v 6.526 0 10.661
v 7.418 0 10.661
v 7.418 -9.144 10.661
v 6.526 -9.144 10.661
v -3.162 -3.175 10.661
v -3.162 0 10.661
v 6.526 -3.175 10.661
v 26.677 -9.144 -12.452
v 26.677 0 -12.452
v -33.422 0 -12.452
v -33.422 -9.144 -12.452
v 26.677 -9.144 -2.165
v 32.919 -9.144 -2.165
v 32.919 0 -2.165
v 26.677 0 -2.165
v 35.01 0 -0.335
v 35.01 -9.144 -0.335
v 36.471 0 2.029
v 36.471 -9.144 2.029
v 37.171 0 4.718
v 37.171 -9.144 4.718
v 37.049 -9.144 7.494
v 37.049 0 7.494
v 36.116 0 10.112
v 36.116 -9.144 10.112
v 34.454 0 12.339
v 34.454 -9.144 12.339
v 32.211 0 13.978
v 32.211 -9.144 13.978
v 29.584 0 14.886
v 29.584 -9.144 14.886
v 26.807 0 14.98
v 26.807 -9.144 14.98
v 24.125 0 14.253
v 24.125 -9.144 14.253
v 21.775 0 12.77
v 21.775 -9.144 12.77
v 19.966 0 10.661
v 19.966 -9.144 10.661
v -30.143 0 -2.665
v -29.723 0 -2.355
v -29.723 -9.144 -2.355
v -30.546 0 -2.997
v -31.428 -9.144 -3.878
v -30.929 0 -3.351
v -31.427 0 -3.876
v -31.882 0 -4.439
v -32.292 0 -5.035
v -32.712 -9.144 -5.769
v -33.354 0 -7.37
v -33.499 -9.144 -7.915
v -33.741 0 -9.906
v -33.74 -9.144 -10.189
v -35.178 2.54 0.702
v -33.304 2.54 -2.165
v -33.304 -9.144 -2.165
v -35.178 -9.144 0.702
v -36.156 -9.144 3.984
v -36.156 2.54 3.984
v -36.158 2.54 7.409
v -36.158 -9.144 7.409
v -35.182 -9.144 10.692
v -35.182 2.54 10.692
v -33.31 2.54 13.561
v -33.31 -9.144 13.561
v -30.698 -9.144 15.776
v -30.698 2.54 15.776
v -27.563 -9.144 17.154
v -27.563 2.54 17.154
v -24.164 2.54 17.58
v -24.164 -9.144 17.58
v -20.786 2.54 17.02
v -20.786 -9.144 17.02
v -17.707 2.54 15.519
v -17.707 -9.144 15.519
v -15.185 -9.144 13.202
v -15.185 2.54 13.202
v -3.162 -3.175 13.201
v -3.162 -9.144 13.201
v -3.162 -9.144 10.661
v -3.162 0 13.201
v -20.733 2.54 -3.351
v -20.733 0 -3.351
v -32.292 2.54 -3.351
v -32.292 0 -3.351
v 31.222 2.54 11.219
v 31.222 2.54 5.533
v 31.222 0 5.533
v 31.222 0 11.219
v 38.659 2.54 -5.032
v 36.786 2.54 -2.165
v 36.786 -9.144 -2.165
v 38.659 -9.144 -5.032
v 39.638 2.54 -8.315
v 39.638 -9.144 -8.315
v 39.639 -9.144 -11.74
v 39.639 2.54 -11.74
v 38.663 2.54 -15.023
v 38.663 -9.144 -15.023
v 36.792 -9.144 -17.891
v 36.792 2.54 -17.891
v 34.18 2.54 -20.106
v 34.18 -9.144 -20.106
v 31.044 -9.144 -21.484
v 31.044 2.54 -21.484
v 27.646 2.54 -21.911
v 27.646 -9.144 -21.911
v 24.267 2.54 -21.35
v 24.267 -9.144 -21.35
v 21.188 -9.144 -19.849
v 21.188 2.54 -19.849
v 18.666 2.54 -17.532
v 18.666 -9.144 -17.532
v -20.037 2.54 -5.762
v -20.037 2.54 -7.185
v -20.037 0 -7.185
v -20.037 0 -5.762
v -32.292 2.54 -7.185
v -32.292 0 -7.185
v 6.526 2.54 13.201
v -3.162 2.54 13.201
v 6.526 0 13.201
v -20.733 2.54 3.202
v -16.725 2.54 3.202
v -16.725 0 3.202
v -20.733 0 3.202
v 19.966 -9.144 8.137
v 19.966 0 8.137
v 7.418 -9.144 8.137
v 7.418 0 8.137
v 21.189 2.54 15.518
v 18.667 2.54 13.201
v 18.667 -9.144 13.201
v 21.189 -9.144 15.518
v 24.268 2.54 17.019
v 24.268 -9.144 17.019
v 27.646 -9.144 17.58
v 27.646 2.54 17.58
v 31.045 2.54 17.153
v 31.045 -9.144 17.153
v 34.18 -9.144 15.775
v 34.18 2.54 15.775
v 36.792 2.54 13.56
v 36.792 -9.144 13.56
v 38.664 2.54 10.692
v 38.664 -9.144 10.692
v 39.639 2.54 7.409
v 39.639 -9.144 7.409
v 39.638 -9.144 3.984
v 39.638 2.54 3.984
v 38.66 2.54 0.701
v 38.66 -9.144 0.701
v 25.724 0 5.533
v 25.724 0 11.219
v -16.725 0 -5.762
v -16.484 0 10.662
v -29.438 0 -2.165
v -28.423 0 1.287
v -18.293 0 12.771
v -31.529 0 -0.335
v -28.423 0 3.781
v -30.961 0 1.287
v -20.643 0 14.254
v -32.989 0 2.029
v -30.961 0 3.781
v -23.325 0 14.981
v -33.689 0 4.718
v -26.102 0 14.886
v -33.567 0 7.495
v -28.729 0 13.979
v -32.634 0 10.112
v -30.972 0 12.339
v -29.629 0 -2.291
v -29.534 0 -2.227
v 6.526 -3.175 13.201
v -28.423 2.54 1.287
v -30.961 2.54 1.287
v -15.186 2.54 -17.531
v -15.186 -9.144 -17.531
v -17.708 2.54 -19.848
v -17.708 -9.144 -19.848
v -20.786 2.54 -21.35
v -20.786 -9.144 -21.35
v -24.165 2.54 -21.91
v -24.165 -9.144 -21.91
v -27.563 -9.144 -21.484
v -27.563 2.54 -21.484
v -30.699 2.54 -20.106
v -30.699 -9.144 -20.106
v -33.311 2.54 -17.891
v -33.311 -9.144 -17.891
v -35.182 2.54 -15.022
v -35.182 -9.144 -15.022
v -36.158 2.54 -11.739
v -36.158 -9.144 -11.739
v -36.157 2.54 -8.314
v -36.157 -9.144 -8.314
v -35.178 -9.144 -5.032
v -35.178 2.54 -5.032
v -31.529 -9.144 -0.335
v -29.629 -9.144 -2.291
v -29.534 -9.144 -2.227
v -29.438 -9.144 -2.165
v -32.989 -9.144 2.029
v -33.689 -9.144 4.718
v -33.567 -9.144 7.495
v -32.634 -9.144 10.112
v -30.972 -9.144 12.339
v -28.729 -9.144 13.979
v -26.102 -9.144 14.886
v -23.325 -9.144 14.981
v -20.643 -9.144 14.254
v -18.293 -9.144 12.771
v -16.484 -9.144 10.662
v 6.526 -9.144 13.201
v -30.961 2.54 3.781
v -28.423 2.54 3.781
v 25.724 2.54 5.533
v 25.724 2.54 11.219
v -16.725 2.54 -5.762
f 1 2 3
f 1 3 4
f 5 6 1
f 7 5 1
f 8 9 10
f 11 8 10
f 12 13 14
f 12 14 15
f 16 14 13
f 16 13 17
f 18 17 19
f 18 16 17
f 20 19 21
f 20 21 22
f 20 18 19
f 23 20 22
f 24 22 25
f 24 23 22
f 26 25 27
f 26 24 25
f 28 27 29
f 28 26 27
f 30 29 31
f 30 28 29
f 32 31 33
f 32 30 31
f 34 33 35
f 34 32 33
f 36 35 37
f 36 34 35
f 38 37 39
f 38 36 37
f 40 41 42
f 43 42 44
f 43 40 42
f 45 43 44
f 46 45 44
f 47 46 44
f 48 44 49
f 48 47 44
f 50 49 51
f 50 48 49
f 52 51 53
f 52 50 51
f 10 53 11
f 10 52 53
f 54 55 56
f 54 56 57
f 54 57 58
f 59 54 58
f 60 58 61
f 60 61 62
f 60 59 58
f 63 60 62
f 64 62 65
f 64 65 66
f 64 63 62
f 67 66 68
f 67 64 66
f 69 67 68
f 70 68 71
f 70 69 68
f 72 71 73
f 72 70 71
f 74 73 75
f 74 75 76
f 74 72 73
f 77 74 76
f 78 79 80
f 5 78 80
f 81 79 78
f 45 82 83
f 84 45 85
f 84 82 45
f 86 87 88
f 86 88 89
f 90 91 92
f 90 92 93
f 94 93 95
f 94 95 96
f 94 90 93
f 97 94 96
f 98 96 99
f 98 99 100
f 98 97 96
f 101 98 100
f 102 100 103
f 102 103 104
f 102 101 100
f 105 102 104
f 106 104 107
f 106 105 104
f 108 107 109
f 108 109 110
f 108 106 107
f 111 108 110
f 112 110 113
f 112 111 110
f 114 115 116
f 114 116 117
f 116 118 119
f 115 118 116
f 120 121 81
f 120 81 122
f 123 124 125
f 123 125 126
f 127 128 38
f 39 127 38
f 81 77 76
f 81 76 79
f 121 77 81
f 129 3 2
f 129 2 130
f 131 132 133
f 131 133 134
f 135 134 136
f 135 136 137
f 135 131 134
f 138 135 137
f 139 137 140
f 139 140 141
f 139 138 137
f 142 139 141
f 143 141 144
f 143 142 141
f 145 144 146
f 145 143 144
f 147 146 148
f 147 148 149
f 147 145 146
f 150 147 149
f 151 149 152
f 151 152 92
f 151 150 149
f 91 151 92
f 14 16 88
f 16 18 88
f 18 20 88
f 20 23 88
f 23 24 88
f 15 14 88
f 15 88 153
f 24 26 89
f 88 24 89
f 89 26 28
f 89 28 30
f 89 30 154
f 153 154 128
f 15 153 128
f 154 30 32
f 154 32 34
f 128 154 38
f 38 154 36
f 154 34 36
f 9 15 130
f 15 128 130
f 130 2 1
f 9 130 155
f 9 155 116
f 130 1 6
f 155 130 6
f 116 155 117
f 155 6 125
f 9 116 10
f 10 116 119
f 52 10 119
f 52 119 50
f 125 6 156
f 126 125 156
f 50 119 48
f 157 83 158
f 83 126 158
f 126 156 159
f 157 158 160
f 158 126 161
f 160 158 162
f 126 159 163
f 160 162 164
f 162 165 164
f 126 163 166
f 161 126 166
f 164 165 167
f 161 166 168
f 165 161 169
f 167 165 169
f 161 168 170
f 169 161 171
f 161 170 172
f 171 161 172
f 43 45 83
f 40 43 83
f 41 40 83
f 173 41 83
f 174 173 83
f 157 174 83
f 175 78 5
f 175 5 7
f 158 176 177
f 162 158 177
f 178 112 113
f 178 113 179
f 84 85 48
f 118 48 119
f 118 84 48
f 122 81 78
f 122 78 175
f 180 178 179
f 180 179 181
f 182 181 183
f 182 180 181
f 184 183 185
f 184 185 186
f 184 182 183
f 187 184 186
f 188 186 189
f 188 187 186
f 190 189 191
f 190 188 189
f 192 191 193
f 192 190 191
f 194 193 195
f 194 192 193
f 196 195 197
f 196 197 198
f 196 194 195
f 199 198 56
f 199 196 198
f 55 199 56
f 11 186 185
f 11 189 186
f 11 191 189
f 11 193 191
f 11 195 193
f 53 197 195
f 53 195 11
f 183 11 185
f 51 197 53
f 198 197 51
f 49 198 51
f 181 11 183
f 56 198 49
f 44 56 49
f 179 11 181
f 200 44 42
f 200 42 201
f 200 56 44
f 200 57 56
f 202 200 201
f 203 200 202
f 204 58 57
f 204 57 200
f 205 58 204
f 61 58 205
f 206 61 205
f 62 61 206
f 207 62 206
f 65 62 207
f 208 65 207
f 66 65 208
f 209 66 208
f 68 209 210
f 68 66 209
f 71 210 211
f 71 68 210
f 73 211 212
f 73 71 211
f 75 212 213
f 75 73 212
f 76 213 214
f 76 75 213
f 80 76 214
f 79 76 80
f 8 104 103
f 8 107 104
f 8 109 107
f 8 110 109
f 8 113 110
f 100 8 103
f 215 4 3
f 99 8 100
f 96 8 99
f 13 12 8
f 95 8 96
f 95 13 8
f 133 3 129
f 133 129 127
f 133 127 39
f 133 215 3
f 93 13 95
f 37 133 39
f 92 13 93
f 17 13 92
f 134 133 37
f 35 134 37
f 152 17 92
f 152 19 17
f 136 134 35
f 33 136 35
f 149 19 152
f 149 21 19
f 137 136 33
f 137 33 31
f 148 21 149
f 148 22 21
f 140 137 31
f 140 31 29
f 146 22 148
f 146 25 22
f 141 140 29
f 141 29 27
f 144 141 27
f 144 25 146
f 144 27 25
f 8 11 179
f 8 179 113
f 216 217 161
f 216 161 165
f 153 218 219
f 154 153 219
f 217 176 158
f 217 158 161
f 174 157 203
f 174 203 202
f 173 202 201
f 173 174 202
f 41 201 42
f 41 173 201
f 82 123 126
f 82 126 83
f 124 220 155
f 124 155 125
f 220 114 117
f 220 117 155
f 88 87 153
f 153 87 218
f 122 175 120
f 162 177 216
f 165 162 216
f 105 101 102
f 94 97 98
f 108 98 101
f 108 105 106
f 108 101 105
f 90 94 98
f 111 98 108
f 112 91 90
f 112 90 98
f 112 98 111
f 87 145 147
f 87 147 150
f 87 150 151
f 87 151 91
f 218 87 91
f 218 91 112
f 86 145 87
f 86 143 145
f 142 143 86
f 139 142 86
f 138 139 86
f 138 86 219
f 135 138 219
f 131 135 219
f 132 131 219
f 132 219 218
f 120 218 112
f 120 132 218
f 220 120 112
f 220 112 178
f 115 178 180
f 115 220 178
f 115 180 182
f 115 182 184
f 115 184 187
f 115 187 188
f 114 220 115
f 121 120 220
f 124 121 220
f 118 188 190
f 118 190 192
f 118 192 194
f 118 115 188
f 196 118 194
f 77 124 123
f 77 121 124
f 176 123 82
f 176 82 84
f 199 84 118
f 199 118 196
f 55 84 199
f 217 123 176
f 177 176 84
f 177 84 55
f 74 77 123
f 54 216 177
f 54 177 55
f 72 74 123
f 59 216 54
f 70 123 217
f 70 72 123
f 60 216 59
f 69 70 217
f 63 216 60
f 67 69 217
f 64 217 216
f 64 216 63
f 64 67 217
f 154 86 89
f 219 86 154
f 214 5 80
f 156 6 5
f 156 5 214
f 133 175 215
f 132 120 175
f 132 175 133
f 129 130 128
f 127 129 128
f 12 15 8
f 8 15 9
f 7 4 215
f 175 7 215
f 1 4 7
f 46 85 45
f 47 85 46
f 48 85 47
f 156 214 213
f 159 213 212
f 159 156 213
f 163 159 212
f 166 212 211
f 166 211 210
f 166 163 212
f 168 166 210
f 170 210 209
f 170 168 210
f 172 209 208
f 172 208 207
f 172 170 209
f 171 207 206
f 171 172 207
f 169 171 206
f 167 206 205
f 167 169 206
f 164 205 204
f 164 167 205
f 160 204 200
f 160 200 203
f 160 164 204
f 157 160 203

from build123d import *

# Parameters (mm, degrees)
BOSS_EXTRUDE1_DEPTH = 9.144
BOSS_EXTRUDE7_START = 2.54
SKETCH3_W           = 5.497965662
SKETCH3_H           = 5.686621346
SKETCH3_W_2         = 2.537497481
SKETCH3_H_2         = 2.494515015
BOSS_EXTRUDE7_DEPTH = 2.54
BOSS_EXTRUDE8_DEPTH = 9.144
SKETCH9_W           = 9.68799942
SKETCH9_H           = 2.539743385
BOSS_EXTRUDE9_DEPTH = 3.175


with BuildPart() as part:
    # Sketch2 → Boss-Extrude1 (new body)
    with BuildSketch(Plane(origin=(0, 0, 0), x_dir=(1, 0, 0), z_dir=(0, 1, 0))):
        with BuildLine():
            Line((-16.484821535, 14.991226562), (19.965175413, 14.992229827))
            ThreePointArc((19.965175413, 14.992229827), (34.453763808, 16.669641544), (32.919177794, 2.165230163))
            ThreePointArc((32.919177794, 2.165230163), (34.454264788, -12.338688941), (19.966174864, -10.660770051))
            Line((19.966174864, -10.660770051), (6.526477702, -10.661139971))
            Line((6.526477702, -10.661139971), (6.526477702, -13.201139972))
            Line((6.526477702, -13.201139972), (18.666916826, -13.200805813))
            ThreePointArc((18.666916826, -13.200805813), (35.566435216, -14.762300874), (36.785563248, 2.165360379))
            ThreePointArc((36.785563248, 2.165360379), (35.565859505, 19.093319416), (18.665967138, 17.532194068))
            Line((18.665967138, 17.532194068), (-15.185563688, 17.531262324))
            ThreePointArc((-15.185563688, 17.531262324), (-32.085077033, 19.092756448), (-33.30420747, 2.165100491))
            ThreePointArc((-33.30420747, 2.165100491), (-32.08450617, -14.762857534), (-15.184614497, -13.201737557))
            Line((-15.184614497, -13.201737557), (-3.161521718, -13.201406628))
            Line((-3.161521718, -13.201406628), (-3.161521718, -10.661406627))
            Line((-3.161521718, -10.661406627), (-16.483822084, -10.661773316))
            ThreePointArc((-16.483822084, -10.661773316), (-30.972409917, -12.339179924), (-29.437822557, 2.165230163))
            ThreePointArc((-29.437822557, 2.165230163), (-29.581379954, 2.259029678), (-29.723191237, 2.355448738))
            ThreePointArc((-29.723191237, 2.355448738), (-30.849950106, 16.788680298), (-16.484821535, 14.991226562))
        make_face()
    extrude(amount=-BOSS_EXTRUDE1_DEPTH)

    # Sketch3 → Boss-Extrude7 (add)
    with BuildSketch(Plane(origin=(0, 0, 0), x_dir=(-1, 0, 0), z_dir=(0, 1, 0)).offset(BOSS_EXTRUDE7_START)):
        with BuildLine():
            Line((-6.526477702, 13.201139972), (-18.666916826, 13.200805813))
            ThreePointArc((-18.666916826, 13.200805813), (-35.566435216, 14.762300874), (-36.785563248, -2.165360379))
            ThreePointArc((-36.785563248, -2.165360379), (-35.565859505, -19.093319416), (-18.665967138, -17.532194068))
            Line((-18.665967138, -17.532194068), (15.185563688, -17.531262324))
            ThreePointArc((15.185563688, -17.531262324), (32.085077033, -19.092756448), (33.30420747, -2.165100491))
            ThreePointArc((33.30420747, -2.165100491), (32.08450617, 14.762857534), (15.184614497, 13.201737557))
            Line((15.184614497, 13.201737557), (3.161521718, 13.201406628))
            Line((3.161521718, 13.201406628), (-6.526477702, 13.201406628))
            Line((-6.526477702, 13.201406628), (-6.526477702, 13.201139972))
        make_face()
        Polygon((16.725192045, 3.202079604), (20.733260983, 3.202079604), (20.733260983, -3.35074569), (32.292495251, -3.35074569), (32.292495251, -7.184972831), (20.037093812, -7.184972831), (20.037093812, -5.761606936), (16.725192045, -5.761606936), align=None, mode=Mode.SUBTRACT)
        with Locations((-28.472988633, 8.375990138)):
            Rectangle(SKETCH3_W, SKETCH3_H, mode=Mode.SUBTRACT)
        with Locations((29.691821719, 2.533771638)):
            Rectangle(SKETCH3_W_2, SKETCH3_H_2, mode=Mode.SUBTRACT)
    extrude(amount=-BOSS_EXTRUDE7_DEPTH)

    # Sketch8 → Boss-Extrude8 (add)
    with BuildSketch(Plane.XZ):
        with BuildLine():
            Line((-16.484821535, -14.991226562), (19.965175413, -14.992229827))
            Line((19.965175413, -14.992229827), (19.965175413, -12.452229827))
            Line((19.965175413, -12.452229827), (-33.422355561, -12.452229827))
            ThreePointArc((-33.422355561, -12.452229827), (-25.785203294, -19.26939309), (-16.484821535, -14.991226562))
        make_face()
        with BuildLine():
            Line((19.965175413, -12.452229827), (19.965175413, -14.992229827))
            ThreePointArc((19.965175413, -14.992229827), (29.266220586, -19.269979209), (36.903423899, -12.452229827))
            Line((36.903423899, -12.452229827), (26.676938614, -12.452229827))
            Line((26.676938614, -12.452229827), (19.965175413, -12.452229827))
        make_face()
        with BuildLine():
            Line((26.676938614, -12.452229827), (36.903423899, -12.452229827))
            ThreePointArc((36.903423899, -12.452229827), (36.591930347, -6.6578073), (32.919177794, -2.165230163))
            Line((32.919177794, -2.165230163), (26.676938614, -2.165230163))
            Line((26.676938614, -2.165230163), (26.676938614, -12.452229827))
        make_face()
        Polygon((19.966174864, 8.137271719), (19.966174864, 10.660770051), (7.41756795, 10.661115444), (7.41756795, 8.137271719), align=None)
    extrude(amount=BOSS_EXTRUDE8_DEPTH)

    # Sketch9 → Boss-Extrude9 (add)
    with BuildSketch(Plane.XZ):
        with Locations((1.682477992, 11.93127832)):
            Rectangle(SKETCH9_W, SKETCH9_H)
    extrude(amount=BOSS_EXTRUDE9_DEPTH)


solid = part.part
